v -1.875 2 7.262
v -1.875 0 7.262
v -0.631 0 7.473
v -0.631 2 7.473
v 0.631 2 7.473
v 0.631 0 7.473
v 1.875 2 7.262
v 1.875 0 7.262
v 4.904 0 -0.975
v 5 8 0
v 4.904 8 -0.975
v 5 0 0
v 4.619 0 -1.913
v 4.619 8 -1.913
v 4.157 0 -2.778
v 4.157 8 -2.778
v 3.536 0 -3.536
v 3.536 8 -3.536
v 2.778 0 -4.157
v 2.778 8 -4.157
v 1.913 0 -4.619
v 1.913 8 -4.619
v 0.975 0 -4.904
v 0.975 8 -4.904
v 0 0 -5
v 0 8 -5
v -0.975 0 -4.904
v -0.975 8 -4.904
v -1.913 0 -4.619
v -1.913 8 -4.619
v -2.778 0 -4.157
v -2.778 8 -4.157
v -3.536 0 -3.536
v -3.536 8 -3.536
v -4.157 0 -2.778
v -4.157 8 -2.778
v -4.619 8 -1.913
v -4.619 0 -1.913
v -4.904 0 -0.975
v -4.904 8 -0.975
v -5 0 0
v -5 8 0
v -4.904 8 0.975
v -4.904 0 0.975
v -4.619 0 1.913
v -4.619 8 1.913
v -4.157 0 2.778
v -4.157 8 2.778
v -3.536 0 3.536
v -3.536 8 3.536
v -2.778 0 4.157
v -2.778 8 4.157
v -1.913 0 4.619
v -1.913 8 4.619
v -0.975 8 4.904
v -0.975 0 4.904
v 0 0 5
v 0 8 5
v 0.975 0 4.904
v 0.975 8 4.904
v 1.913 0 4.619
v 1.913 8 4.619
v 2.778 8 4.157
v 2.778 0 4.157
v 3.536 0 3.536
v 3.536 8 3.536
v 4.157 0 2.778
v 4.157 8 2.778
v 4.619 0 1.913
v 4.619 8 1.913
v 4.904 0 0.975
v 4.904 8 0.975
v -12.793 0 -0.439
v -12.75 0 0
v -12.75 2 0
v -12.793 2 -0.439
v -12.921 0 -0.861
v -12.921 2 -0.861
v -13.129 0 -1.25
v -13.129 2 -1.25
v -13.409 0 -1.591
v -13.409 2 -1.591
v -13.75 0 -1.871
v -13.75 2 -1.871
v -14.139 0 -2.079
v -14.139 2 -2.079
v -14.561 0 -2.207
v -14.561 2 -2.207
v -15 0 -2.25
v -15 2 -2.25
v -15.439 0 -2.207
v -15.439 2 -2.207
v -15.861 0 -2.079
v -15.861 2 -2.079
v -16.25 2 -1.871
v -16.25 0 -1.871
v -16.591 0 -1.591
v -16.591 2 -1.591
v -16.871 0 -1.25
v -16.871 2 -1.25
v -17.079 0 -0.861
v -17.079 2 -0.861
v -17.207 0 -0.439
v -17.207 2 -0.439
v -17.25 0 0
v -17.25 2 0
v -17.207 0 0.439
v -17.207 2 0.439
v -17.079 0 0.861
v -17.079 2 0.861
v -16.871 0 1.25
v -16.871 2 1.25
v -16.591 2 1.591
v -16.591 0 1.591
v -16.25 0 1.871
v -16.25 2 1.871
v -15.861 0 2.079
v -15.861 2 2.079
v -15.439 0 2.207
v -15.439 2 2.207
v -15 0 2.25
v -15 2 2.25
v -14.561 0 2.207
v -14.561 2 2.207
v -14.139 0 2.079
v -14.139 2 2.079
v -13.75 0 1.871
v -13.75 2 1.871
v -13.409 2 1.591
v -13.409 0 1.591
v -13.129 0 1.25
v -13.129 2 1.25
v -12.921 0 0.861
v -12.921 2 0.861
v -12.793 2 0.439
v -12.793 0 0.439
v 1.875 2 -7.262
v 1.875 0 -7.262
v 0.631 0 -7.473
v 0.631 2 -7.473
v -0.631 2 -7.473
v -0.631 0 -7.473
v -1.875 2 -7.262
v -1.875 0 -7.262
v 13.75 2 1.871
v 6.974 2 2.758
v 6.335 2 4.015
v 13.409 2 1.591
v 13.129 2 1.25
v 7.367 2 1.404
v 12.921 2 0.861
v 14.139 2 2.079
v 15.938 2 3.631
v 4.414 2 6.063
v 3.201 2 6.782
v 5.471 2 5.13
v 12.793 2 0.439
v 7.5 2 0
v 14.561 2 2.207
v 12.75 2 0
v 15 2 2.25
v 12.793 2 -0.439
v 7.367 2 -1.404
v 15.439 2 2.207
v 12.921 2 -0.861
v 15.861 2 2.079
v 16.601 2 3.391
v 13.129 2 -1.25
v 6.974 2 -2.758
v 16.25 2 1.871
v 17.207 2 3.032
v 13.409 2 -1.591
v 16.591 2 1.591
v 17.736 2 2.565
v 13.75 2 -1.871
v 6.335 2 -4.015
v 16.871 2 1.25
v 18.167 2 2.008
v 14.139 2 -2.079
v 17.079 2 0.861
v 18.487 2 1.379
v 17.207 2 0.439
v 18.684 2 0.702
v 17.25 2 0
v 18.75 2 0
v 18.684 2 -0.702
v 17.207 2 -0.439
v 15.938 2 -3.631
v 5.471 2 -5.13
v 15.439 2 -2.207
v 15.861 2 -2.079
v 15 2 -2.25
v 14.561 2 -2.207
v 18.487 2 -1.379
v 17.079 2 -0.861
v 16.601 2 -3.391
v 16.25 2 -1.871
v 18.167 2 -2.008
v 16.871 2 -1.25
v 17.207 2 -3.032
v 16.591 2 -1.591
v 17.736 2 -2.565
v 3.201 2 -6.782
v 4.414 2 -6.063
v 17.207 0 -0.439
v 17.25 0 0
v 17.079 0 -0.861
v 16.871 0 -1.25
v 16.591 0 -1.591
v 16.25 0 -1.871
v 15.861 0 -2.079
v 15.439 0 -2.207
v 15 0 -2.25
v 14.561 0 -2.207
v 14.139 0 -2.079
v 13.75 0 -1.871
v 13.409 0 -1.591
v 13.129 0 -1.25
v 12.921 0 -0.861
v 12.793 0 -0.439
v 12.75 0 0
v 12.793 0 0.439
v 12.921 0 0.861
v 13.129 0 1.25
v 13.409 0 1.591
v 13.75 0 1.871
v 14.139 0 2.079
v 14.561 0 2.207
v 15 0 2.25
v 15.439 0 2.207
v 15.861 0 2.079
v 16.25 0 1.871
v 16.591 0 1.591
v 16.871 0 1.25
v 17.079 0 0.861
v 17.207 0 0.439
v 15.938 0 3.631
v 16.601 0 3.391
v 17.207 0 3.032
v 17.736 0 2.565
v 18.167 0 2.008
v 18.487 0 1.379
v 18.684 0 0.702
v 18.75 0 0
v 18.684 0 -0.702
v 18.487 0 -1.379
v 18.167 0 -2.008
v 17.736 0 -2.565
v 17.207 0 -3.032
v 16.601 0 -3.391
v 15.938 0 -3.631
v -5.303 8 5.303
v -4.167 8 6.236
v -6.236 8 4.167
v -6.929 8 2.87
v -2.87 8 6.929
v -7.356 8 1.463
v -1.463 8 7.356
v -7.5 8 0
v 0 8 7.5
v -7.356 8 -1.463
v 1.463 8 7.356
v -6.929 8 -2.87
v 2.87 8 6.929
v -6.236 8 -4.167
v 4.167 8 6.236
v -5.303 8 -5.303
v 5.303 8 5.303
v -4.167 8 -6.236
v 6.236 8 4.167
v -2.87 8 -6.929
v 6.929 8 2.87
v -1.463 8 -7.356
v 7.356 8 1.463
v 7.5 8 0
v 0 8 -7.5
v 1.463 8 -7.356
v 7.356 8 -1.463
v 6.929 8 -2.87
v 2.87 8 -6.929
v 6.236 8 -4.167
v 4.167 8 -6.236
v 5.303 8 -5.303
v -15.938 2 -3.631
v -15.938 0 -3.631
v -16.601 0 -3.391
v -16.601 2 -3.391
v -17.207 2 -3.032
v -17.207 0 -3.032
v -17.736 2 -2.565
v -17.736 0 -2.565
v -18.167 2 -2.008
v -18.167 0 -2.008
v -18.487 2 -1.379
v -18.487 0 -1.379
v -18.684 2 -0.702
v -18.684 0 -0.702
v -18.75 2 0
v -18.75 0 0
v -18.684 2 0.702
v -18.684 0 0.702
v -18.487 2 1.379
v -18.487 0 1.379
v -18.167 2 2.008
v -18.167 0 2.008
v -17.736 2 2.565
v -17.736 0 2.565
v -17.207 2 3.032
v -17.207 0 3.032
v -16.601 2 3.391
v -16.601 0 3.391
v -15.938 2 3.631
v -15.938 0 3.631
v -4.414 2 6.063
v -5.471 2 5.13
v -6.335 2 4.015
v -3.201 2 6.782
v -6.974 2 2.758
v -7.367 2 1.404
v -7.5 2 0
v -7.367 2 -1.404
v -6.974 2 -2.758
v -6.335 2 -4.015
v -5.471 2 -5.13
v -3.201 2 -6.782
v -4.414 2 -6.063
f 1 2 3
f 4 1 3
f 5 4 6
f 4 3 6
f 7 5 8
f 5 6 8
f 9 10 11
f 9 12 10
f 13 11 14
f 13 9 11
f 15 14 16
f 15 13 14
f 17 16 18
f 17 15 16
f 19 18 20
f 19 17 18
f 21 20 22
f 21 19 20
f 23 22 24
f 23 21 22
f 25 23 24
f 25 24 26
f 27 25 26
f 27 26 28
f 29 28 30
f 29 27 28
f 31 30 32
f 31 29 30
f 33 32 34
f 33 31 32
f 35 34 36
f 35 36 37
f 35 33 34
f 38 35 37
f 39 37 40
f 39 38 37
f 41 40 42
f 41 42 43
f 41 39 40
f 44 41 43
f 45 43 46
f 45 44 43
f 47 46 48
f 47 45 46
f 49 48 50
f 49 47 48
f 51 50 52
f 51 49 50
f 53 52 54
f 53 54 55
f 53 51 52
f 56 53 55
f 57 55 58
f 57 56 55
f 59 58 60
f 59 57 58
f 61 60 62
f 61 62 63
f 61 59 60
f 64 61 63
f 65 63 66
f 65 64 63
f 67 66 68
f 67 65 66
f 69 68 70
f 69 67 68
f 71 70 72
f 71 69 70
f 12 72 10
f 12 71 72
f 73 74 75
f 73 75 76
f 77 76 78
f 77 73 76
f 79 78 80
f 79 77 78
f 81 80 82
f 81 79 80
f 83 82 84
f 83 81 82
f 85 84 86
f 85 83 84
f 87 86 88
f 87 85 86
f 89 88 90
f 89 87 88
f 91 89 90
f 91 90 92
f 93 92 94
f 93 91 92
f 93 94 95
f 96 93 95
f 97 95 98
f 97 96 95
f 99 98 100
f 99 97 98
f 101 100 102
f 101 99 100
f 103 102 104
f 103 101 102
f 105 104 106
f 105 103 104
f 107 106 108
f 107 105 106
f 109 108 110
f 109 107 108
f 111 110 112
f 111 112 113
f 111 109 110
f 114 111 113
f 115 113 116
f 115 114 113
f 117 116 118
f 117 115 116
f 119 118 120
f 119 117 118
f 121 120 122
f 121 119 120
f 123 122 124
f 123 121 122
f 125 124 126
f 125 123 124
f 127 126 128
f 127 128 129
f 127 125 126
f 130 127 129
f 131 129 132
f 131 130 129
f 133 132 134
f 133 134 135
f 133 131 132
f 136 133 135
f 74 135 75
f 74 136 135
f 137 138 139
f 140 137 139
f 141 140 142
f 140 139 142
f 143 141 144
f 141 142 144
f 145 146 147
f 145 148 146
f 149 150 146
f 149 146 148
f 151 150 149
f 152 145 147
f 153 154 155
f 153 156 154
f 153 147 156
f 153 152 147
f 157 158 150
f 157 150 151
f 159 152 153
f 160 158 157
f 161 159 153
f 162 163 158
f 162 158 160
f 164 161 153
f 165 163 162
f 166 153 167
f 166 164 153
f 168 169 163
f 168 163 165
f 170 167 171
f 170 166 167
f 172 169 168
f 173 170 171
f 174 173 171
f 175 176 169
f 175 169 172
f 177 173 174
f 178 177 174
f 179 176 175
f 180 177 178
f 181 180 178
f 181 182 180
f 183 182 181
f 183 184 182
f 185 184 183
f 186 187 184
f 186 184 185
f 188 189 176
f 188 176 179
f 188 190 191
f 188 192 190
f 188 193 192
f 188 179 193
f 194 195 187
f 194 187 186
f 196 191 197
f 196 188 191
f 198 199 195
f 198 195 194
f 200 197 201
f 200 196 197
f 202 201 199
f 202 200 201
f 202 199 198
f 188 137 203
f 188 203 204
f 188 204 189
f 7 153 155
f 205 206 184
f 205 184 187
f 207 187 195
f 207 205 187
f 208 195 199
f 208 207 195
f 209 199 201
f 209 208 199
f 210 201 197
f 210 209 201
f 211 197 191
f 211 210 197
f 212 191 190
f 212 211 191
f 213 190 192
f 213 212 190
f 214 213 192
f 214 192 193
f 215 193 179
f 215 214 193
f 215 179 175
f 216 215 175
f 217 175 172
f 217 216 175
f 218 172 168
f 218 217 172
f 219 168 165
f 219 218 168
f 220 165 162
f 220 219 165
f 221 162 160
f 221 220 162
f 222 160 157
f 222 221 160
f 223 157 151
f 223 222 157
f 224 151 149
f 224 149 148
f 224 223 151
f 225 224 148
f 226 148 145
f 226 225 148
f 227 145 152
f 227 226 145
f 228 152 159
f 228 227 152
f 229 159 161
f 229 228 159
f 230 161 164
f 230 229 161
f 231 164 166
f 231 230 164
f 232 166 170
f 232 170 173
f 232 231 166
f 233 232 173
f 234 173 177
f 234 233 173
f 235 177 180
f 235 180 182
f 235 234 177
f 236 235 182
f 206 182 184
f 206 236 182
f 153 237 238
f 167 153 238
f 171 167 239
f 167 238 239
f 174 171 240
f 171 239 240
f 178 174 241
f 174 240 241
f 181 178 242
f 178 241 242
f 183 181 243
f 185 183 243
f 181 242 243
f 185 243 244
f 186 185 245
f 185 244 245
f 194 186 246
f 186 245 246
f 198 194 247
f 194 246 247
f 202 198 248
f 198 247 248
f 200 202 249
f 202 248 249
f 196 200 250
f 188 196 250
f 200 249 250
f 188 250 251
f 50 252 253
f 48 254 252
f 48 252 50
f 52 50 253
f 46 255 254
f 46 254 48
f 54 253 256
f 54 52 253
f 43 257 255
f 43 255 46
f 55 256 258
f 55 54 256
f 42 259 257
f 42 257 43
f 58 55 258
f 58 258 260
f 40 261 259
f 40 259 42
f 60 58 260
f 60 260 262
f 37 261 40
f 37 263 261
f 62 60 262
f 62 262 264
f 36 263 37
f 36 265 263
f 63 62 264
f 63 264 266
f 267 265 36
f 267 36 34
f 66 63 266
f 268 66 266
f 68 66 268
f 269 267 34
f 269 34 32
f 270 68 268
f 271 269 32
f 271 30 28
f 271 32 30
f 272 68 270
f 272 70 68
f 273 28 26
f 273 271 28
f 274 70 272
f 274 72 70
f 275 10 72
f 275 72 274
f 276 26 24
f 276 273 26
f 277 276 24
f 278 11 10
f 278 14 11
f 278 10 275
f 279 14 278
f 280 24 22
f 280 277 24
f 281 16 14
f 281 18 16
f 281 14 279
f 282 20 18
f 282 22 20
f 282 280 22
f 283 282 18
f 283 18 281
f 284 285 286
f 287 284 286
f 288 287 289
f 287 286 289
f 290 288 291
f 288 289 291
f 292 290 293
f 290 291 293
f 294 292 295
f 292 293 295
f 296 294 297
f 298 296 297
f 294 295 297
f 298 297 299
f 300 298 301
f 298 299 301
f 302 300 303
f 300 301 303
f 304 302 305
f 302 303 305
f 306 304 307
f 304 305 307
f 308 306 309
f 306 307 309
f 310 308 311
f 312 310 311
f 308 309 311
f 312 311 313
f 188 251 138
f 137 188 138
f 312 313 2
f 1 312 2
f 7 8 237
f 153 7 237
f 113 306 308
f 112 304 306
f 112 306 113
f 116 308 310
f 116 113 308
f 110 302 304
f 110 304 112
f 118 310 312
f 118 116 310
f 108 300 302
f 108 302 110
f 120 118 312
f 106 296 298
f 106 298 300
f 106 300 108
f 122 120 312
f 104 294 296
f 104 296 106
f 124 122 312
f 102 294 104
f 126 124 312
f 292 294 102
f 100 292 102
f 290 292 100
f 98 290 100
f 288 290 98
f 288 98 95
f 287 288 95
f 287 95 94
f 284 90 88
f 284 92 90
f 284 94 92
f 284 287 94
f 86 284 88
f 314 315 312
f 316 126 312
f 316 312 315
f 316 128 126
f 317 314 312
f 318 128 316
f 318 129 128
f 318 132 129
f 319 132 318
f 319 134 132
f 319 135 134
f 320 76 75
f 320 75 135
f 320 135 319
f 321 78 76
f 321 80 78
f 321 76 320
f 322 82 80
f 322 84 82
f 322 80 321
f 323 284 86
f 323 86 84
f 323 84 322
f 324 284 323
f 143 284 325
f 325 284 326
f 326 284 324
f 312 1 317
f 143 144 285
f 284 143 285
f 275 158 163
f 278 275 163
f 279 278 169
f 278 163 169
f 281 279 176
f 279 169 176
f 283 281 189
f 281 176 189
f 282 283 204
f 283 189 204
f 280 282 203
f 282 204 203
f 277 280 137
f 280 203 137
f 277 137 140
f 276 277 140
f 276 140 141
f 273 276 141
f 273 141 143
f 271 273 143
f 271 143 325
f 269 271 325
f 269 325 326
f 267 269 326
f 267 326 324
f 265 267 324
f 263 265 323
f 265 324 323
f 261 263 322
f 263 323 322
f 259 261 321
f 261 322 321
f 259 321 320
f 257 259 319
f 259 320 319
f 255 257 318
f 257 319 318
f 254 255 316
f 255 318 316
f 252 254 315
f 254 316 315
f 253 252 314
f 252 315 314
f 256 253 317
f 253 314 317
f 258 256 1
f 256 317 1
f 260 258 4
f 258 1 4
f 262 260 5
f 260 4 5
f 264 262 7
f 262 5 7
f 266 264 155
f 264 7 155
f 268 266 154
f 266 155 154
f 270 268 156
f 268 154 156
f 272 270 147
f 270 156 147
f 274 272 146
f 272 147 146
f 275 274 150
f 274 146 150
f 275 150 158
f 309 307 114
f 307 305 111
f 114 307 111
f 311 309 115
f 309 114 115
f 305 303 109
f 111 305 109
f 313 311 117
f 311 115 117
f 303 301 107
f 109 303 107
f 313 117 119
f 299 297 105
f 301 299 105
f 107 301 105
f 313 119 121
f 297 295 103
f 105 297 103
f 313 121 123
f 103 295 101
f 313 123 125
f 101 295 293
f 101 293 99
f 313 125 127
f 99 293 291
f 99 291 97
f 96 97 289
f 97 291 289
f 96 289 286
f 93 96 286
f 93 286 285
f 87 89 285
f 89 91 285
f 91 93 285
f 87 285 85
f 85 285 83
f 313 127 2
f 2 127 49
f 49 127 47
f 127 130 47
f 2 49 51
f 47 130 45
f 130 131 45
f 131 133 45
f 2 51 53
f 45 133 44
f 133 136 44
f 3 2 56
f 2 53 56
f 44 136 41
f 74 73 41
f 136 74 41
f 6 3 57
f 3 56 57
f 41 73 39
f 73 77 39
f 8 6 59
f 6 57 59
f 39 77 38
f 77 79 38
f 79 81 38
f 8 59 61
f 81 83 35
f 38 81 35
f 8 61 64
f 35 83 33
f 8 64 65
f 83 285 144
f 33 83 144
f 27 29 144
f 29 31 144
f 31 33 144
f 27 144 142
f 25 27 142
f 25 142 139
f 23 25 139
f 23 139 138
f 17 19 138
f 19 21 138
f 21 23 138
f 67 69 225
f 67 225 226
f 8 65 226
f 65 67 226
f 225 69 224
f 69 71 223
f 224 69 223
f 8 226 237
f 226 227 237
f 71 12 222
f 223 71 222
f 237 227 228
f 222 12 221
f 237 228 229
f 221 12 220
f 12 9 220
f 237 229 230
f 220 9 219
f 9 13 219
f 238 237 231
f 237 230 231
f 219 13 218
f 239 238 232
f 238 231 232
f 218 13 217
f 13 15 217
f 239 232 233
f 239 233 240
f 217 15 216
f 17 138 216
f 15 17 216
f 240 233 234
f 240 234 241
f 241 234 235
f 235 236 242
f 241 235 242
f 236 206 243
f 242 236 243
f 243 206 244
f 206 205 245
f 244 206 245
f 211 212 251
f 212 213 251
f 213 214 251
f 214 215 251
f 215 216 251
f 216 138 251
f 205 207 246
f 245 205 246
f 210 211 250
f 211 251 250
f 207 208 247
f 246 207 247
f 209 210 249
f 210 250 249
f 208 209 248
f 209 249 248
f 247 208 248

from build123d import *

# Parameters (mm, degrees)
SKETCH2_R           = 2.25
SKETCH2_R_2         = 5
BOSS_EXTRUDE2_DEPTH = 2
SKETCH3_R           = 7.5
SKETCH3_R_2         = 5
BOSS_EXTRUDE3_DEPTH = 6


with BuildPart() as part:
    # Sketch2 → Boss-Extrude2 (new body)
    with BuildSketch(Plane(origin=(0, 0, 0), x_dir=(1, 0, 0), z_dir=(0, 1, 0))):
        with BuildLine():
            Line((-1.875, 7.261843774), (-15.9375, 3.630921887))
            ThreePointArc((-15.9375, 3.630921887), (-18.75, 0), (-15.9375, -3.630921887))
            Line((-15.9375, -3.630921887), (-1.875, -7.261843774))
            ThreePointArc((-1.875, -7.261843774), (0, -7.5), (1.875, -7.261843774))
            Line((1.875, -7.261843774), (15.9375, -3.630921887))
            ThreePointArc((15.9375, -3.630921887), (18.75, 0), (15.9375, 3.630921887))
            Line((15.9375, 3.630921887), (1.875, 7.261843774))
            ThreePointArc((1.875, 7.261843774), (0, 7.5), (-1.875, 7.261843774))
        make_face()
        with Locations((-15, 0)):
            Circle(SKETCH2_R, mode=Mode.SUBTRACT)
        Circle(SKETCH2_R_2, mode=Mode.SUBTRACT)
        with Locations((15, 0)):
            Circle(SKETCH2_R, mode=Mode.SUBTRACT)
    extrude(amount=BOSS_EXTRUDE2_DEPTH)

    # Sketch3 → Boss-Extrude3 (add)
    with BuildSketch(Plane(origin=(0, 2, 0), x_dir=(1, 0, 0), z_dir=(0, 1, 0))):
        Circle(SKETCH3_R)
        Circle(SKETCH3_R_2, mode=Mode.SUBTRACT)
    extrude(amount=BOSS_EXTRUDE3_DEPTH)


solid = part.part
